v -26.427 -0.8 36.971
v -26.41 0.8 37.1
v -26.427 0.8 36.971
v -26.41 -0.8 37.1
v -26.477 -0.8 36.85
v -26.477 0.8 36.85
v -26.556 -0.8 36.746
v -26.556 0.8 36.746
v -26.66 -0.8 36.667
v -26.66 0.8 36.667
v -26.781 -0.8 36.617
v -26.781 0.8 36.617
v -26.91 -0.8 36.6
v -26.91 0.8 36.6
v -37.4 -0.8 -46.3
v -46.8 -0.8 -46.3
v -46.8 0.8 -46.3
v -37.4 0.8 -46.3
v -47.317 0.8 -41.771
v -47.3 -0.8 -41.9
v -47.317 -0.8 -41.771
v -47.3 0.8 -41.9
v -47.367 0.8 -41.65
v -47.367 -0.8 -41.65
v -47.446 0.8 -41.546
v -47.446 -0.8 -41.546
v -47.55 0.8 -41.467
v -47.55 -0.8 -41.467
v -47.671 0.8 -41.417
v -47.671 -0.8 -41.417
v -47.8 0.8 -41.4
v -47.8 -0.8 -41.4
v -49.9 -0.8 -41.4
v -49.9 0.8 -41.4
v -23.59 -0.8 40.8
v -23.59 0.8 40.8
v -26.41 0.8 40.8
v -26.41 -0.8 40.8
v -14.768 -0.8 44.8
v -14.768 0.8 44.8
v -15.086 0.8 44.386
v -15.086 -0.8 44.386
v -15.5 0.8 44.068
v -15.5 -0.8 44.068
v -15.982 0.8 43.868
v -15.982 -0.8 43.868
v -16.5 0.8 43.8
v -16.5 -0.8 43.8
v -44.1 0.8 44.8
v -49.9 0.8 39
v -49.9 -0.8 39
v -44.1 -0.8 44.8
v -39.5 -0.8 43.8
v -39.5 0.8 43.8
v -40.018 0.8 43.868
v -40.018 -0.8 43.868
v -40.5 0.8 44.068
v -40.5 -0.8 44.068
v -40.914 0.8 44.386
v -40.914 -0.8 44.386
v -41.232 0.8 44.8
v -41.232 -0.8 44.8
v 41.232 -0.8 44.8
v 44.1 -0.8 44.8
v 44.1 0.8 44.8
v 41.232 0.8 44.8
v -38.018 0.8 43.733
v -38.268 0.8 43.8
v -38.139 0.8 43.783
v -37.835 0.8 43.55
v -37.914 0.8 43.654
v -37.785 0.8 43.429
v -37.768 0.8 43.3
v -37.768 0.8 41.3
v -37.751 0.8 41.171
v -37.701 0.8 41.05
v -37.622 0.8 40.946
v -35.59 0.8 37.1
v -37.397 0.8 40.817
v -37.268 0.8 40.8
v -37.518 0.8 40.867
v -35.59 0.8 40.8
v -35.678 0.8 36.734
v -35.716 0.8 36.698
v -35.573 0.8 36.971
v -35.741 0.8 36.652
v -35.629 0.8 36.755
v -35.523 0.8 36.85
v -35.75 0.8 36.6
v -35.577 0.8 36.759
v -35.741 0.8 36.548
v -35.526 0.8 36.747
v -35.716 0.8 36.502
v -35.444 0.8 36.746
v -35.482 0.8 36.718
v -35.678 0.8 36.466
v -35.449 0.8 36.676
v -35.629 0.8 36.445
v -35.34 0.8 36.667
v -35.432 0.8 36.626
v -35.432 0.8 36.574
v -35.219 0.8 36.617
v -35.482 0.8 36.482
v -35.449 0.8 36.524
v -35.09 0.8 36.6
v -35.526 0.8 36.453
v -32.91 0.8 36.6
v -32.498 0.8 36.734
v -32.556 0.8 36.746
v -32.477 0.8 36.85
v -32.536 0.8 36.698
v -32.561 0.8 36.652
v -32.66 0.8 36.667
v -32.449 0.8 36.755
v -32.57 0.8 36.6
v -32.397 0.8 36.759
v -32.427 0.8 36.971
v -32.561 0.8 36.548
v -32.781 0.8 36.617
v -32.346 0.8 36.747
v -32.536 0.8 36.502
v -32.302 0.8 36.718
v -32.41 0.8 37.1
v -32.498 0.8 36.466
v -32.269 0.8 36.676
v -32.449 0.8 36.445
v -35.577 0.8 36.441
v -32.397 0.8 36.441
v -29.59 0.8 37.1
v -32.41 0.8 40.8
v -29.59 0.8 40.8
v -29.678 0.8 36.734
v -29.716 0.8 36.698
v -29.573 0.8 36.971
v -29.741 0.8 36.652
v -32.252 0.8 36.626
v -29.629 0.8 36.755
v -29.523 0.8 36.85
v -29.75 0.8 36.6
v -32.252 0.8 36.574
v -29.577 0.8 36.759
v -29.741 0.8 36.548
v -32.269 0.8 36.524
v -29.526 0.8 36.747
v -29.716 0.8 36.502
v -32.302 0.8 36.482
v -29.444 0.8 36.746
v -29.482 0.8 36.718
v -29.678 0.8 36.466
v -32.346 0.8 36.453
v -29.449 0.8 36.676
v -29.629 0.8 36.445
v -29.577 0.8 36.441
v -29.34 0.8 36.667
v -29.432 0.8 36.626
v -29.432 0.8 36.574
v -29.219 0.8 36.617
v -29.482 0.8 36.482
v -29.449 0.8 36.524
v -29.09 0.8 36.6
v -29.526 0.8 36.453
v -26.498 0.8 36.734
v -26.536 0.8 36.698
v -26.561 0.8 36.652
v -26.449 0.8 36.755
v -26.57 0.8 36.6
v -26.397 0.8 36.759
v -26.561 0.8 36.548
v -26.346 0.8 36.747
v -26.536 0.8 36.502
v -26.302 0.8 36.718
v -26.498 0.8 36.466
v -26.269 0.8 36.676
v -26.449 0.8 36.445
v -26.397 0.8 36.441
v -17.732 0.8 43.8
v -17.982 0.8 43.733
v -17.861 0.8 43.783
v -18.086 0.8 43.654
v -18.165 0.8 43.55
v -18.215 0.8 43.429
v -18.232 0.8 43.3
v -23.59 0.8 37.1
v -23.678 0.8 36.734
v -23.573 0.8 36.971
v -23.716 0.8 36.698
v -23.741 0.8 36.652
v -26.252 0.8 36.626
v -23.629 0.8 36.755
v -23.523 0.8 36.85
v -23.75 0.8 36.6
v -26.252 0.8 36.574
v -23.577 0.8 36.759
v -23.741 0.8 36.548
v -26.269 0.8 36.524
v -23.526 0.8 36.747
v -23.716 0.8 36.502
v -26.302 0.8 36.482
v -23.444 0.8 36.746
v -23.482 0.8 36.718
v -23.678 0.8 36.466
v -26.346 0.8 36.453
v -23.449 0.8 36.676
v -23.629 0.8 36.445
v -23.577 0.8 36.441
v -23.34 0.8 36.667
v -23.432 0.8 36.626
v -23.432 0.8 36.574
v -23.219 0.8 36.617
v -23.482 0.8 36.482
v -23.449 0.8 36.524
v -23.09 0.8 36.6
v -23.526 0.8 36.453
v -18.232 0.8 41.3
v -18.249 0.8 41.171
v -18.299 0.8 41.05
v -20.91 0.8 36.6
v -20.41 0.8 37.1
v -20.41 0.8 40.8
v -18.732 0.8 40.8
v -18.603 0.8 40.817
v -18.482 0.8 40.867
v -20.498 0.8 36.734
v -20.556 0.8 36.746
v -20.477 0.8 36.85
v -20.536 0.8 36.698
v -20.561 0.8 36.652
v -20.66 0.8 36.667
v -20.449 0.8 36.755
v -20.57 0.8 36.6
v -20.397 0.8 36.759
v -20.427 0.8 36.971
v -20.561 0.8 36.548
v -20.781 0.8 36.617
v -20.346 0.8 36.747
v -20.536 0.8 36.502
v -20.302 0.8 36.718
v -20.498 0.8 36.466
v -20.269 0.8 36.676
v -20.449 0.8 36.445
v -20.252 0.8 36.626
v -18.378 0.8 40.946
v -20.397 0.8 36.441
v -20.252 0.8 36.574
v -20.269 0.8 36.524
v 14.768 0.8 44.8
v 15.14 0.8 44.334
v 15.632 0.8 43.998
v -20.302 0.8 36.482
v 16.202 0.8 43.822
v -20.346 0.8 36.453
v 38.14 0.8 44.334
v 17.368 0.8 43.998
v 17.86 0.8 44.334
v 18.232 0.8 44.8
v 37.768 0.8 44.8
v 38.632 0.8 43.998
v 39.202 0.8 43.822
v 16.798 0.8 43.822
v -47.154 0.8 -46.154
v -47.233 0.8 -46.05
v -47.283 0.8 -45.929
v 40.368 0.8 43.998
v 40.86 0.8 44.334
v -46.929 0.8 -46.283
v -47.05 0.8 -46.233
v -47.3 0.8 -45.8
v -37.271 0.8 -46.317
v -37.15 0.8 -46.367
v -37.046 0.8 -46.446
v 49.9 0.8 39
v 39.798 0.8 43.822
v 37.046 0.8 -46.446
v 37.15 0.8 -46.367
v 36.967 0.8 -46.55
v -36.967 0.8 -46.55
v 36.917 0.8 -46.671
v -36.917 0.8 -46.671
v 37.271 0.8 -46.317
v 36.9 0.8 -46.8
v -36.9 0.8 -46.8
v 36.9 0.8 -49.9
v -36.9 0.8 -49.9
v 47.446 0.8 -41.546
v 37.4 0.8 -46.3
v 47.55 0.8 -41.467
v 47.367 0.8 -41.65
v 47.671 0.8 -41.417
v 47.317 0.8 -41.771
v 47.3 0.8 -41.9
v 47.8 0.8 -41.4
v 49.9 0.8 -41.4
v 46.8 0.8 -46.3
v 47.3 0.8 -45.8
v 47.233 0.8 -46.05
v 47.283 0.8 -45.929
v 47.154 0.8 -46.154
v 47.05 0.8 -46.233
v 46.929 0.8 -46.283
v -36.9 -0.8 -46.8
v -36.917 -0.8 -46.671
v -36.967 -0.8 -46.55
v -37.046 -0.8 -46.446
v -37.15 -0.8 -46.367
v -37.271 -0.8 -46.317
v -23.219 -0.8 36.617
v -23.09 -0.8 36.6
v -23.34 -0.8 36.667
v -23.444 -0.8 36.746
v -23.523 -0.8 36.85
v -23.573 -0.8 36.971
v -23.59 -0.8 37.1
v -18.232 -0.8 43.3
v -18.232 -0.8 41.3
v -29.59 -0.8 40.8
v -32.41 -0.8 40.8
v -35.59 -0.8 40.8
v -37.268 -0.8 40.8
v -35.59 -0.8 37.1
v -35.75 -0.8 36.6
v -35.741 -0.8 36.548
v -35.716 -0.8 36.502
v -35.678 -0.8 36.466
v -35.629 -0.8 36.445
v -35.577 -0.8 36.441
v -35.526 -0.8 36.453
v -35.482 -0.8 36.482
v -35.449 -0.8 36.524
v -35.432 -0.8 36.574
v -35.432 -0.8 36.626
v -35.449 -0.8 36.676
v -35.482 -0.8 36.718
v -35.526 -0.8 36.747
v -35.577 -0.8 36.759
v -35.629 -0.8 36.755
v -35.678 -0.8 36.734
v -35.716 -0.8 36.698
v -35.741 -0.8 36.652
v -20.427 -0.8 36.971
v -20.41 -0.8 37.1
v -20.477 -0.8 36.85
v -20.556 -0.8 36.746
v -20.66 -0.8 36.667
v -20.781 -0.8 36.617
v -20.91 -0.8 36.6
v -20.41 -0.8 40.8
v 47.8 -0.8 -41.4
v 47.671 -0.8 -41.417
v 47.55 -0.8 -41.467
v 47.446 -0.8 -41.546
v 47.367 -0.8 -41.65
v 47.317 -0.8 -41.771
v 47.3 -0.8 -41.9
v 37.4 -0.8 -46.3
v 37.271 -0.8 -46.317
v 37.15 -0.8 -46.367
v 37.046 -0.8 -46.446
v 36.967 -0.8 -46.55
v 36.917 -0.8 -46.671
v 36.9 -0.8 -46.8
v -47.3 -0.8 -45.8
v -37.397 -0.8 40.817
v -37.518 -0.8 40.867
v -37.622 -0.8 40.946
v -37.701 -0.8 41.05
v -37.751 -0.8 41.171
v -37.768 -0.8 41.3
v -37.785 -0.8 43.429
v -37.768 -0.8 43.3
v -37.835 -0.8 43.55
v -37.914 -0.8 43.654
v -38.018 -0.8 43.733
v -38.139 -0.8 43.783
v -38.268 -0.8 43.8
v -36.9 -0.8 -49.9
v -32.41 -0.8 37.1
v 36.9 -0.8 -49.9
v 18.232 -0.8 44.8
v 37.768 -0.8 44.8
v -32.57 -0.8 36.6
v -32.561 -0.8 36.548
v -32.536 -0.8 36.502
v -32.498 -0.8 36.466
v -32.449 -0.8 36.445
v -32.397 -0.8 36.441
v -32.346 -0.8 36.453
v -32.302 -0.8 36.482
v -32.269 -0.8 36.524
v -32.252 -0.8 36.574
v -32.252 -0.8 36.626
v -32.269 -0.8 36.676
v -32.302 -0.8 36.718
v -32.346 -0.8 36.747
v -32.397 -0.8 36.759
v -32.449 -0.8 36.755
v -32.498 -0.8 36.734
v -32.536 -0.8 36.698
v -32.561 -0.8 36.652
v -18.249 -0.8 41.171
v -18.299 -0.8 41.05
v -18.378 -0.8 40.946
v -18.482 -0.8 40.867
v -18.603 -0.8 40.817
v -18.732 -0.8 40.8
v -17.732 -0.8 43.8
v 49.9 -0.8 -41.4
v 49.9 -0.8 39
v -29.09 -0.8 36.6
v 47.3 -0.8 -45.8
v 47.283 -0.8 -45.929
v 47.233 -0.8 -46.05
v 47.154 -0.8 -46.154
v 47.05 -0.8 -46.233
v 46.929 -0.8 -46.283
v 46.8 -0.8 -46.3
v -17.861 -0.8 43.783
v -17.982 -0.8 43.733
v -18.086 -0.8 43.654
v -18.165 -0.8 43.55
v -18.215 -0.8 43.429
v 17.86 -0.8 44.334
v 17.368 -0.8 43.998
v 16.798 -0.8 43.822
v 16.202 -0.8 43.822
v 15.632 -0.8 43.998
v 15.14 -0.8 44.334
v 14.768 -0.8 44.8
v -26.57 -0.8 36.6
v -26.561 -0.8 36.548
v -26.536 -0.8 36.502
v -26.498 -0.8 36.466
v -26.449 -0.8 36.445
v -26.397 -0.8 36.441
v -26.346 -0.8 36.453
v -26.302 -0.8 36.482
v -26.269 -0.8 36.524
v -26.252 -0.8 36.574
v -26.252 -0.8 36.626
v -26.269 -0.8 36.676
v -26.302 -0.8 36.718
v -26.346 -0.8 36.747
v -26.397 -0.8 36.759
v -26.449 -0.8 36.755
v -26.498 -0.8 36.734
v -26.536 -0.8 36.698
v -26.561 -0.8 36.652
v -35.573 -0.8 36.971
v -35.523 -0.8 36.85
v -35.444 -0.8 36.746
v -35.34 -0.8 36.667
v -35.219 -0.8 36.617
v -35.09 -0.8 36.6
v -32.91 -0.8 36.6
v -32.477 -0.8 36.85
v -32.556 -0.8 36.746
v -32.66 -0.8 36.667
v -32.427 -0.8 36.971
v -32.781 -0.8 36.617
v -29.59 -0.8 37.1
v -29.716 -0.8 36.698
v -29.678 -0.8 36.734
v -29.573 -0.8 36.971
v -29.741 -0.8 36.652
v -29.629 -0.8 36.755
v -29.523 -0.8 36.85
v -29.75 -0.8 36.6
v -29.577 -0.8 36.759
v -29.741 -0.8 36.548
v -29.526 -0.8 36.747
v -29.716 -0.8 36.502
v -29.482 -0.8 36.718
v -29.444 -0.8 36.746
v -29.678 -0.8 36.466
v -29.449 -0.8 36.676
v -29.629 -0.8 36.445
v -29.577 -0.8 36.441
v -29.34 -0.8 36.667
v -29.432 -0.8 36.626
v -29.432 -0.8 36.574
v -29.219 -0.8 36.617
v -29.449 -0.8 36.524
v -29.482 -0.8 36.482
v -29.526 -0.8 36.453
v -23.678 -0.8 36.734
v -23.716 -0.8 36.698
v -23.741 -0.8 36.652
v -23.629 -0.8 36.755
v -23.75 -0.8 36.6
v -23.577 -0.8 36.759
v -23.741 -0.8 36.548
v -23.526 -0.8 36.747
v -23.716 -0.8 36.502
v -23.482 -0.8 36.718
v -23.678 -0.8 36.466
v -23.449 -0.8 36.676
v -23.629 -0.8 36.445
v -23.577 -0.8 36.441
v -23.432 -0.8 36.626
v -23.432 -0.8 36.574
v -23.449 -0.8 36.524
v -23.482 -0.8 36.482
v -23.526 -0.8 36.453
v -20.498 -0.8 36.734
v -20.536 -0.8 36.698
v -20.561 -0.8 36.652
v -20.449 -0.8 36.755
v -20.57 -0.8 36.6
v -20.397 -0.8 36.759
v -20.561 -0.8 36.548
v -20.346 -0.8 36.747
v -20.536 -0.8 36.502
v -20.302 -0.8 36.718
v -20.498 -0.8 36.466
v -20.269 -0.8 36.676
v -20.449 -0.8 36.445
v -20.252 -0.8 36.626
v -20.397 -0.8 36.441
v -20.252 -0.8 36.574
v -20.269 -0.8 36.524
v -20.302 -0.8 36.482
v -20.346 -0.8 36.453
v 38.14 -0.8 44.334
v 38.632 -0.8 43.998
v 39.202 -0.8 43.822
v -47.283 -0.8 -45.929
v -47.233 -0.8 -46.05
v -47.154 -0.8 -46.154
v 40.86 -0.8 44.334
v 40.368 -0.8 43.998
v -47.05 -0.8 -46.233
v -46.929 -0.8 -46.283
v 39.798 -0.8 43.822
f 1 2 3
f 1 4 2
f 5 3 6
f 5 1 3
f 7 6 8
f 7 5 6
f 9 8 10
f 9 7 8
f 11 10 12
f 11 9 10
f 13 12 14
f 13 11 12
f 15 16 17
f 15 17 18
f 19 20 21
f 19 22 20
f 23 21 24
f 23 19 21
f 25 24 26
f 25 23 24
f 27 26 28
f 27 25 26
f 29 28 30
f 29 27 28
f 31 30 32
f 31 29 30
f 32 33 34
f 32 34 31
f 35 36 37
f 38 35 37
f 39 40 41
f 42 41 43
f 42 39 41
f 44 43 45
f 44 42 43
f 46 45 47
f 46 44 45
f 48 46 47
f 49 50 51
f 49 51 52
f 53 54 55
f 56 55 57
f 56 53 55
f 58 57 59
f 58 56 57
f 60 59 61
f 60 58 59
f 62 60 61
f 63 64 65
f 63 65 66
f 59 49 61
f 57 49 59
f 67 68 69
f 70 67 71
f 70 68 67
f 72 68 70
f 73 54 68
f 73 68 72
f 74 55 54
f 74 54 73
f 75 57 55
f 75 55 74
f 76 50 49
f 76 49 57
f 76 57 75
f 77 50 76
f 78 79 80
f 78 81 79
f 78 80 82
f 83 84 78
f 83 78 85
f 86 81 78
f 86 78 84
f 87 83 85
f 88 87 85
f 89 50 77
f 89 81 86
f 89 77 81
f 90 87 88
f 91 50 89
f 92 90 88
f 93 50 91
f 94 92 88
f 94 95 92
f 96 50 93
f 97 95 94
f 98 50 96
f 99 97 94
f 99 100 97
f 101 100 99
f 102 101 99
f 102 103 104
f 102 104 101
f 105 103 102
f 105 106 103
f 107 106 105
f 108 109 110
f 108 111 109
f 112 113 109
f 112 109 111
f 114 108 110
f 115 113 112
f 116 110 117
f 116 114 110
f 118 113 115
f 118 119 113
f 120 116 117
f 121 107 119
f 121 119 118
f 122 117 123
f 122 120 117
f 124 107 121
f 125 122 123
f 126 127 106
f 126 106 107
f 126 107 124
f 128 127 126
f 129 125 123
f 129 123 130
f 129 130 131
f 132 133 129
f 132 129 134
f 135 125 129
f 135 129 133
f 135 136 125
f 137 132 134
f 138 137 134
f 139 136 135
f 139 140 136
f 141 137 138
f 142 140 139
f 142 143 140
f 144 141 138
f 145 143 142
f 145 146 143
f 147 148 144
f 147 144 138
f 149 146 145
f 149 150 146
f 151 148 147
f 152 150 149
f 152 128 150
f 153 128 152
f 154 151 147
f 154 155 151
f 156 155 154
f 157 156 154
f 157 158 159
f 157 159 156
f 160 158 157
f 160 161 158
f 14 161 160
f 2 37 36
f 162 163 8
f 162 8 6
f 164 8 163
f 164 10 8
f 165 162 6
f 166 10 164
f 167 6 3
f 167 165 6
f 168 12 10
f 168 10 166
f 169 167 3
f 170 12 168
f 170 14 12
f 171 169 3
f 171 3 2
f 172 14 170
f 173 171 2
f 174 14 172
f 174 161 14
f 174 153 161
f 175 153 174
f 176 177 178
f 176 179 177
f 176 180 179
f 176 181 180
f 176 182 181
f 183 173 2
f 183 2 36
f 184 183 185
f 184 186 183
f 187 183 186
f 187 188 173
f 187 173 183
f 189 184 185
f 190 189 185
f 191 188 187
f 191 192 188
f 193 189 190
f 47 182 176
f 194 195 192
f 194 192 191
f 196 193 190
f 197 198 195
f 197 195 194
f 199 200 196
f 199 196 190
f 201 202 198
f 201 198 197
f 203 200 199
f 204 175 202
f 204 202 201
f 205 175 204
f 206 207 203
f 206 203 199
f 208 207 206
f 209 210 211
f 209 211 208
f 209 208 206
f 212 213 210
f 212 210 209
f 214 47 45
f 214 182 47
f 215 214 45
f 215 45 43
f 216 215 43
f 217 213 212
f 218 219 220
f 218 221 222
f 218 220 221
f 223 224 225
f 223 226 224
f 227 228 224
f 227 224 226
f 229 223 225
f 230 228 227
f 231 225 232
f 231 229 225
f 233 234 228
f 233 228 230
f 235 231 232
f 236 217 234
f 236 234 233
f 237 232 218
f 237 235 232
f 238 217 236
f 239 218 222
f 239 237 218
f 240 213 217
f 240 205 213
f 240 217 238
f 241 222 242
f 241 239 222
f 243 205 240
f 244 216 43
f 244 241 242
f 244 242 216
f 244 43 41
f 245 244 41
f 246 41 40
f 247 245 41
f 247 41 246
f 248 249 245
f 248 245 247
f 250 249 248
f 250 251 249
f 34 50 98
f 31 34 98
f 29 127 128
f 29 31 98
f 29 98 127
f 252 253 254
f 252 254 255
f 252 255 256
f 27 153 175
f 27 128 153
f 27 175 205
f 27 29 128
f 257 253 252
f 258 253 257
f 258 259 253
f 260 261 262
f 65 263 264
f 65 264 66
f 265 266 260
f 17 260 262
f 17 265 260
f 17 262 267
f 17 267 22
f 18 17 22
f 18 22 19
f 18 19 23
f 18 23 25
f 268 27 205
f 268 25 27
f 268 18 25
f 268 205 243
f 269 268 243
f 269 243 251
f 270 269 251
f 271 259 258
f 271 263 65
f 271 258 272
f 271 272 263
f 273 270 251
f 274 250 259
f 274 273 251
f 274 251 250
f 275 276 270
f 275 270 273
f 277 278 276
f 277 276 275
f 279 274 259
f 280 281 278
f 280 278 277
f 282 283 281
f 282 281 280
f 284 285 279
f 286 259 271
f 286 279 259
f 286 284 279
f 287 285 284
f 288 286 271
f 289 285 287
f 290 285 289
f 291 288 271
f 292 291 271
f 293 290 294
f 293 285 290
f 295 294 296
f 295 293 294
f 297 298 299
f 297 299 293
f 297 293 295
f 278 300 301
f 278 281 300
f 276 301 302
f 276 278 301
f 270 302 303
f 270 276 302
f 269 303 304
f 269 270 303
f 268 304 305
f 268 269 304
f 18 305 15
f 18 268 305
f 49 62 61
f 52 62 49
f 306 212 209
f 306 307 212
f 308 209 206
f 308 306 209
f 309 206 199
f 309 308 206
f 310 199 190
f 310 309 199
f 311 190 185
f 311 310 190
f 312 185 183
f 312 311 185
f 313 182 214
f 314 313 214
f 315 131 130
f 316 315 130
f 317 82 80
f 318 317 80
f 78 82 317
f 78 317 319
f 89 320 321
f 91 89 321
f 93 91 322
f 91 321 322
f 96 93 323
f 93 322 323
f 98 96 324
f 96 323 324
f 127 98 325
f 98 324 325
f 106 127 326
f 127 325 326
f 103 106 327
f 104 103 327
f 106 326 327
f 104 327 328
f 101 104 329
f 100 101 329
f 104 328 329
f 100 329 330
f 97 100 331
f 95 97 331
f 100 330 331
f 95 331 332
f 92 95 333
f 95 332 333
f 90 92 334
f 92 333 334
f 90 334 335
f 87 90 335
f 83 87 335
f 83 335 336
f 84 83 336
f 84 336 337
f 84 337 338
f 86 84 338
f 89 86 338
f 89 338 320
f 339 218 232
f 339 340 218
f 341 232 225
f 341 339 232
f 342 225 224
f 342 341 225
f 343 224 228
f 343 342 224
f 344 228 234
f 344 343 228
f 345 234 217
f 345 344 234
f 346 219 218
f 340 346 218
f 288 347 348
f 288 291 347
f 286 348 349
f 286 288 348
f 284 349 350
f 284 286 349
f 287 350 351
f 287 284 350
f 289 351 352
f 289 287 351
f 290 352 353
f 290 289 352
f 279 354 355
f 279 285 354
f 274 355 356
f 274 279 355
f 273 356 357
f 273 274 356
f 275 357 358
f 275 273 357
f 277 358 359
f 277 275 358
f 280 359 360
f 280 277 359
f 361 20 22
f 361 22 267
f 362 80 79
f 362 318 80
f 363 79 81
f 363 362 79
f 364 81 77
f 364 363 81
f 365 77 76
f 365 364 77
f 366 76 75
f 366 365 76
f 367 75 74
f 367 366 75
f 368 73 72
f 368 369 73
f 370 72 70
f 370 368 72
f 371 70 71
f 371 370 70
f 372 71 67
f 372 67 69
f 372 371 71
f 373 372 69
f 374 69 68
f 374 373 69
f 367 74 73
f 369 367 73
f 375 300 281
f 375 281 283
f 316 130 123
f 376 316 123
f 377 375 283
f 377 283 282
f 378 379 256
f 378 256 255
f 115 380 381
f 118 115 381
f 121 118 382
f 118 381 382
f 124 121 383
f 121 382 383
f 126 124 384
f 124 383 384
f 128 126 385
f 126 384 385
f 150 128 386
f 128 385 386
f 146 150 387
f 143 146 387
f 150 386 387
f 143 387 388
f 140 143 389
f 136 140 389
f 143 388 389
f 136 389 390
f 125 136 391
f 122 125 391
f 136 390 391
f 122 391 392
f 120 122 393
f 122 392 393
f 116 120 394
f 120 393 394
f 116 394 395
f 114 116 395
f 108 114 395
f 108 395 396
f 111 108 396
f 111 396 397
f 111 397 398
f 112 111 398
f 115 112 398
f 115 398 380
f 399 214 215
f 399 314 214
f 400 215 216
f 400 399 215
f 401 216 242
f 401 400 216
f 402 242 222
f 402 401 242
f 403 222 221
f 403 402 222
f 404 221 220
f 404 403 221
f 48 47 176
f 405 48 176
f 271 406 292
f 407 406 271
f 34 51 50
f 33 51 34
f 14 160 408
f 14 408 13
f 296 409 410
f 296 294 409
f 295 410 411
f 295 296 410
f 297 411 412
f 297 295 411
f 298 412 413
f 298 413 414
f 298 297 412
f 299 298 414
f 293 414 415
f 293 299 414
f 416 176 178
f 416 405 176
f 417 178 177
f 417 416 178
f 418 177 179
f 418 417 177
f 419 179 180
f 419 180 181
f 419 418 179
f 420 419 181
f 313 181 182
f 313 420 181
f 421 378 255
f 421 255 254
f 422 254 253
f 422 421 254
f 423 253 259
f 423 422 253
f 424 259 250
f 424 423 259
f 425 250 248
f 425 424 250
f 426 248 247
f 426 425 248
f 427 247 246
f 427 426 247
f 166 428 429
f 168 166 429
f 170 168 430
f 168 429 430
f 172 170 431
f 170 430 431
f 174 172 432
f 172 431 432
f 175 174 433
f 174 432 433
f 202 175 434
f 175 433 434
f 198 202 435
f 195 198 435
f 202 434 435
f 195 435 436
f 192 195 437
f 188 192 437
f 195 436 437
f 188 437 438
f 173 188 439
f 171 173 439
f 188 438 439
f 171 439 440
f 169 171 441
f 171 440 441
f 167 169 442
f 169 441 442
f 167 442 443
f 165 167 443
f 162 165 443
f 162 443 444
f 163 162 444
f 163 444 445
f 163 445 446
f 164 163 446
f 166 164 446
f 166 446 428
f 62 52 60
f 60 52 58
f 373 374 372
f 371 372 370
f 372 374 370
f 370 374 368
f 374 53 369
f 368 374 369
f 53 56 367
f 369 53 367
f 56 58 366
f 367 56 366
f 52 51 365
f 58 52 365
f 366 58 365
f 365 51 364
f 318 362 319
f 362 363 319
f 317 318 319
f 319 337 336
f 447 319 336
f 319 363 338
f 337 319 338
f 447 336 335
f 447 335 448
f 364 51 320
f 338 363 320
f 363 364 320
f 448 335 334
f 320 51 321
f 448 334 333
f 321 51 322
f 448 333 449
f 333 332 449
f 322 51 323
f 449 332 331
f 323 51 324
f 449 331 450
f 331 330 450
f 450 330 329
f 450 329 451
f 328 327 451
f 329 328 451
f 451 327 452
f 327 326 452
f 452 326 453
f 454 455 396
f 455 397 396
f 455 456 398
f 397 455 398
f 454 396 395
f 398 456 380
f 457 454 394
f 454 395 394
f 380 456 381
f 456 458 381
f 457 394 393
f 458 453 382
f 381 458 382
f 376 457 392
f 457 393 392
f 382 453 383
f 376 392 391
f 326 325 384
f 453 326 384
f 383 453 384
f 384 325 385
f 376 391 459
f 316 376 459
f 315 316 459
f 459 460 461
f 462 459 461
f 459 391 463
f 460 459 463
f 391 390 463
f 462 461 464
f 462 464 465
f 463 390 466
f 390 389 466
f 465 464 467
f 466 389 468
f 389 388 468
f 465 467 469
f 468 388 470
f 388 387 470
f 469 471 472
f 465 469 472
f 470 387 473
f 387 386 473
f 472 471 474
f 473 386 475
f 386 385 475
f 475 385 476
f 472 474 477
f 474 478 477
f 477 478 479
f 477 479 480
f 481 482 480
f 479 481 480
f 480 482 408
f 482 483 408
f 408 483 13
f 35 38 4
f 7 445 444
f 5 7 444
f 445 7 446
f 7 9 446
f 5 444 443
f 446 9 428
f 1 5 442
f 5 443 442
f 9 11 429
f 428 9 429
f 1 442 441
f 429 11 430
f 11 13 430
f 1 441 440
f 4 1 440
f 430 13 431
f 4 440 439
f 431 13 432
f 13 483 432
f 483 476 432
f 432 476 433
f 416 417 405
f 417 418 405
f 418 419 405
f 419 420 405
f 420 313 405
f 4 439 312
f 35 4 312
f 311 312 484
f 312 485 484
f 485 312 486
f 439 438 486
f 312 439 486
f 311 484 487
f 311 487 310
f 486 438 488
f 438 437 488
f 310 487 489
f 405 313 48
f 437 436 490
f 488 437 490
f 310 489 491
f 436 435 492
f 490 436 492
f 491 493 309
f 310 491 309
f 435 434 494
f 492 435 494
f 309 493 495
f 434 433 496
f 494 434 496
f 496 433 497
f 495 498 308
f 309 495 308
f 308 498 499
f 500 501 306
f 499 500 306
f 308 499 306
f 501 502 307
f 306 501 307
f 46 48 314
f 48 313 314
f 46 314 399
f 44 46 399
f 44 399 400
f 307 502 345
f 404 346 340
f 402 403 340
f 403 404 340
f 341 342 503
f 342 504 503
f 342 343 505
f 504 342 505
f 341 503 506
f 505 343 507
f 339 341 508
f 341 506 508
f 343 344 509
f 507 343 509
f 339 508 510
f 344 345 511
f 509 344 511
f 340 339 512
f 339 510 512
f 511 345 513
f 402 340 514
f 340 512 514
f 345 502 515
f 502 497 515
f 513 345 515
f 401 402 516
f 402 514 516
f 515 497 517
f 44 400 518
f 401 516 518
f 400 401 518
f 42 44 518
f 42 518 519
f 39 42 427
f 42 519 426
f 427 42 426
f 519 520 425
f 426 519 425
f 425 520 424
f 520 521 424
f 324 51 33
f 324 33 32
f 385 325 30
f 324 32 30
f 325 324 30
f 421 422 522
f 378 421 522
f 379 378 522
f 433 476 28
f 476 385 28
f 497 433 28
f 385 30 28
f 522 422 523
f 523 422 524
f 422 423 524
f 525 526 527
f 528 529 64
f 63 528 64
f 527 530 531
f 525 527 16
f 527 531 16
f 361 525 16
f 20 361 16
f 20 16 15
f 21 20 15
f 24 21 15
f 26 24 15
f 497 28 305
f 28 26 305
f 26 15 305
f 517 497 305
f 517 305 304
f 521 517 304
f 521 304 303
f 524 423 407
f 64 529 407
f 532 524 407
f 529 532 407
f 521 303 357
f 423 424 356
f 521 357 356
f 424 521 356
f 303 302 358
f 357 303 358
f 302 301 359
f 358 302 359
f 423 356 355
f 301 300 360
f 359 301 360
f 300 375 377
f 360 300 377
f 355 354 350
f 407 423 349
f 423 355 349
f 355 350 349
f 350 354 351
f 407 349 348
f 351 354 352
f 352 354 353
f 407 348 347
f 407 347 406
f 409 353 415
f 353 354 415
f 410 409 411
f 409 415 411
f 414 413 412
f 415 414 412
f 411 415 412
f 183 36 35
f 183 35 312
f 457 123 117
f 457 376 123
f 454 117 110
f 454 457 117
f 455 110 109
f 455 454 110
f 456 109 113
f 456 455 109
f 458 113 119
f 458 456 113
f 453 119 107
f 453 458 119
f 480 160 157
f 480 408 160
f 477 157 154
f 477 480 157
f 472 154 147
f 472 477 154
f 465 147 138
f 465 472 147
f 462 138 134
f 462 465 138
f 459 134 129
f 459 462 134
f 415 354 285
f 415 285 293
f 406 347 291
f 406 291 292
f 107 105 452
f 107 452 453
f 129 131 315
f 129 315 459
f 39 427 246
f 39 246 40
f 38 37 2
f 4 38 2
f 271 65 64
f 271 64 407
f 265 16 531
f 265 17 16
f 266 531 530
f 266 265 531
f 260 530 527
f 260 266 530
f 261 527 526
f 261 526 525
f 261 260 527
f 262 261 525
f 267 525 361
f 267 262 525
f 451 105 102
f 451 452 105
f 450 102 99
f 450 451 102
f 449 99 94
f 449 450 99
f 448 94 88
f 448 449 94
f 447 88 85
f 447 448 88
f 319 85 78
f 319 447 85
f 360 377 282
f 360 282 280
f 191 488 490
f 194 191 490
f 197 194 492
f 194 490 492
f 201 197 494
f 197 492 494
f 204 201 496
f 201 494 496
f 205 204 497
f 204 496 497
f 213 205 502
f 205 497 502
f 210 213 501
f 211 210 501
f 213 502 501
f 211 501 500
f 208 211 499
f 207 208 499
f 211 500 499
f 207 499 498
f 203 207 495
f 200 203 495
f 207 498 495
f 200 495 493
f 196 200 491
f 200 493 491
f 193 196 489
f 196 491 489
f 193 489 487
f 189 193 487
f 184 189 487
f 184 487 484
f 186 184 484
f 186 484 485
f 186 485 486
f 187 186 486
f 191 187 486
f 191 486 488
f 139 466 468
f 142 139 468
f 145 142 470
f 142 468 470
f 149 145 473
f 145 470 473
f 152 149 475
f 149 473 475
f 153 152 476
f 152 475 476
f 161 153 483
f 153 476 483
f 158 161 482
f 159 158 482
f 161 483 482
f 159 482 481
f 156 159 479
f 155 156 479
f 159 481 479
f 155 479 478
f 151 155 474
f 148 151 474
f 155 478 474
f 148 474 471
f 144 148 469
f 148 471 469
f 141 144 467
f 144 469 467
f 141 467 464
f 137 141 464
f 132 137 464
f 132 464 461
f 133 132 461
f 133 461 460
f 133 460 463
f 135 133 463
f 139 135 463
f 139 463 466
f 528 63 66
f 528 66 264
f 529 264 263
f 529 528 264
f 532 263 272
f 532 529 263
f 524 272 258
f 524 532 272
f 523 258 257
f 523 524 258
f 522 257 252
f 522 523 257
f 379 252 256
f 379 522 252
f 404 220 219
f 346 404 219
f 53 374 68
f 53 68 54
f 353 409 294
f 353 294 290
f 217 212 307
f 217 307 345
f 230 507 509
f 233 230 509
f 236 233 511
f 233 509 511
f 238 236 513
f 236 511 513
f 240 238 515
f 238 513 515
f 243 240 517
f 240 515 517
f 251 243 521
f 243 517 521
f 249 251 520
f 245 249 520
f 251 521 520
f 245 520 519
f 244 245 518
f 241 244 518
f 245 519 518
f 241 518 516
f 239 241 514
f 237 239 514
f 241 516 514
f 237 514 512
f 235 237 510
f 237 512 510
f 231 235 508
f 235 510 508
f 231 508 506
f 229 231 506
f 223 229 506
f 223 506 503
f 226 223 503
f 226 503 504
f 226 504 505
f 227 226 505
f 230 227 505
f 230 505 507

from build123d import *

# Parameters (mm, degrees)
GENERALSHAPE_DEPTH           = 0.8
ADDTOLERANCE_START           = -0.8
ADDTOLERANCE_DEPTH           = 1.6
BACKPLANE_DEPTH              = 71.573791169
BACKPLANE_DEPTH_BACK         = 71.573791169
RF_W                         = 3.18
RF_H                         = 4.2
CUT_EXTRUDE1_DEPTH           = 71.587392642
FILLET1_R                    = 0.5
F_0_32_0_32_DIAMETER_HOLE1_D = 0.32
FILLET2_R                    = 0.5


# Read off the part's stored shape, not the designer's step: AddTolerance
with BuildPart() as part:
    # Sketch2 → GeneralShape (new, symmetric)
    with BuildSketch(Plane(origin=(0, 0, 0), x_dir=(1, 0, 0), z_dir=(0, 1, 0))):
        Polygon((47.4, 46.4), (37, 46.4), (37, 50), (-37, 50), (-37, 46.4), (-47.4, 46.4), (-47.4, 41.5), (-50, 41.5), (-50, -38.9), (-41.5, -47.4), (41.5, -47.4), (50, -38.9), (50, 41.5), (47.4, 41.5), align=None)
    extrude(amount=GENERALSHAPE_DEPTH, both=True)

    # AddTolerance outline → AddTolerance (cut)
    with BuildSketch(Plane(origin=(0, 0, 0), x_dir=(1, 0, 0), z_dir=(0, 1, 0)).offset(ADDTOLERANCE_START)):
        Polygon((49.9, 41.4), (49.9, -39), (50, -38.9), (50, 41.5), (47.4, 41.5), (47.4, 46.4), (37, 46.4), (37, 50), (-37, 50), (-37, 46.4), (-47.4, 46.4), (-47.4, 41.5), (-50, 41.5), (-50, -38.9), (-49.9, -39), (-49.9, 41.4), (-47.3, 41.4), (-47.3, 46.3), (-36.9, 46.3), (-36.9, 49.9), (36.9, 49.9), (36.9, 46.3), (47.3, 46.3), (47.3, 41.4), align=None)
    extrude(amount=ADDTOLERANCE_DEPTH, mode=Mode.SUBTRACT)

    # Sketch4 → Backplane (cut, two sides: drawn at the far end of the back side and taken through both)
    with BuildSketch(Plane(origin=(0, 0, 0), x_dir=(1, 0, 0), z_dir=(0, 1, 0)).offset(-BACKPLANE_DEPTH_BACK)):
        with BuildLine():
            Line((41.5, -47.4), (44.1, -44.8))
            Line((44.1, -44.8), (41.232050808, -44.8))
            ThreePointArc((41.232050808, -44.8), (39.5, -43.8), (37.767949192, -44.8))
            Line((37.767949192, -44.8), (18.232050808, -44.8))
            ThreePointArc((18.232050808, -44.8), (16.5, -43.8), (14.767949192, -44.8))
            Line((14.767949192, -44.8), (-14.767949192, -44.8))
            ThreePointArc((-14.767949192, -44.8), (-16.5, -43.8), (-18.232050808, -44.8))
            Line((-18.232050808, -44.8), (-37.767949192, -44.8))
            ThreePointArc((-37.767949192, -44.8), (-39.5, -43.8), (-41.232050808, -44.8))
            Line((-41.232050808, -44.8), (-44.1, -44.8))
            Line((-44.1, -44.8), (-41.5, -47.4))
            Line((-41.5, -47.4), (41.5, -47.4))
        make_face()
    extrude(amount=BACKPLANE_DEPTH + BACKPLANE_DEPTH_BACK, mode=Mode.SUBTRACT)

    # RF → Cut-Extrude1 (cut, through all)
    with BuildSketch(Plane(origin=(0, 0.8, 0), x_dir=(1, 0, 0), z_dir=(0, 1, 0))):
        with Locations((-22, -38.7)):
            Rectangle(RF_W, RF_H)
        with Locations((-28, -38.7)):
            Rectangle(RF_W, RF_H)
        with Locations((-34, -38.7)):
            Rectangle(RF_W, RF_H)
        with BuildLine():
            Line((-18.232050808, -40.8), (-20.41, -40.8))
            Line((-20.41, -40.8), (-23.59, -40.8))
            Line((-23.59, -40.8), (-26.41, -40.8))
            Line((-26.41, -40.8), (-29.59, -40.8))
            Line((-29.59, -40.8), (-32.41, -40.8))
            Line((-32.41, -40.8), (-35.59, -40.8))
            Line((-35.59, -40.8), (-37.767949192, -40.8))
            Line((-37.767949192, -40.8), (-37.767949192, -43.8))
            Line((-37.767949192, -43.8), (-39.5, -43.8))
            ThreePointArc((-39.5, -43.8), (-38.5, -44.067949192), (-37.767949192, -44.8))
            Line((-37.767949192, -44.8), (-18.232050808, -44.8))
            ThreePointArc((-18.232050808, -44.8), (-17.5, -44.067949192), (-16.5, -43.8))
            Line((-16.5, -43.8), (-18.232050808, -43.8))
            Line((-18.232050808, -43.8), (-18.232050808, -40.8))
        make_face()
    extrude(amount=-CUT_EXTRUDE1_DEPTH, mode=Mode.SUBTRACT)

    # Fillet1
    fillet1_edges = [part.edges().sort_by_distance(p)[0] for p in [
        (-23.59, 0, 36.6),
        (-20.41, 0, 36.6),
        (-18.232050808, 0, 40.8),
        (-18.232050808, 0, 43.8),
        (-37.767949192, 0, 43.8),
        (-37.767949192, 0, 40.8),
        (-35.59, 0, 36.6),
        (-32.41, 0, 36.6),
        (-29.59, 0, 36.6),
        (-26.41, 0, 36.6),
    ]]
    fillet(fillet1_edges, radius=FILLET1_R)

    # Ø0.32 (0.32) Diameter Hole1 (through all)
    with Locations(Plane(origin=(0, 0.8, 0), x_dir=(1, 0, 0), z_dir=(0, 1, 0))):
        with Locations((-20.41, -36.6), (-23.59, -36.6), (-26.41, -36.6), (-29.59, -36.6), (-32.41, -36.6), (-35.59, -36.6)):
            Hole(F_0_32_0_32_DIAMETER_HOLE1_D / 2)

    # Fillet2
    fillet2_edges = [part.edges().sort_by_distance(p)[0] for p in [
        (47.3, 0, -41.4),
        (47.3, 0, -46.3),
        (36.9, 0, -46.3),
        (-36.9, 0, -46.3),
        (-47.3, 0, -46.3),
        (-47.3, 0, -41.4),
    ]]
    fillet(fillet2_edges, radius=FILLET2_R)


solid = part.part
